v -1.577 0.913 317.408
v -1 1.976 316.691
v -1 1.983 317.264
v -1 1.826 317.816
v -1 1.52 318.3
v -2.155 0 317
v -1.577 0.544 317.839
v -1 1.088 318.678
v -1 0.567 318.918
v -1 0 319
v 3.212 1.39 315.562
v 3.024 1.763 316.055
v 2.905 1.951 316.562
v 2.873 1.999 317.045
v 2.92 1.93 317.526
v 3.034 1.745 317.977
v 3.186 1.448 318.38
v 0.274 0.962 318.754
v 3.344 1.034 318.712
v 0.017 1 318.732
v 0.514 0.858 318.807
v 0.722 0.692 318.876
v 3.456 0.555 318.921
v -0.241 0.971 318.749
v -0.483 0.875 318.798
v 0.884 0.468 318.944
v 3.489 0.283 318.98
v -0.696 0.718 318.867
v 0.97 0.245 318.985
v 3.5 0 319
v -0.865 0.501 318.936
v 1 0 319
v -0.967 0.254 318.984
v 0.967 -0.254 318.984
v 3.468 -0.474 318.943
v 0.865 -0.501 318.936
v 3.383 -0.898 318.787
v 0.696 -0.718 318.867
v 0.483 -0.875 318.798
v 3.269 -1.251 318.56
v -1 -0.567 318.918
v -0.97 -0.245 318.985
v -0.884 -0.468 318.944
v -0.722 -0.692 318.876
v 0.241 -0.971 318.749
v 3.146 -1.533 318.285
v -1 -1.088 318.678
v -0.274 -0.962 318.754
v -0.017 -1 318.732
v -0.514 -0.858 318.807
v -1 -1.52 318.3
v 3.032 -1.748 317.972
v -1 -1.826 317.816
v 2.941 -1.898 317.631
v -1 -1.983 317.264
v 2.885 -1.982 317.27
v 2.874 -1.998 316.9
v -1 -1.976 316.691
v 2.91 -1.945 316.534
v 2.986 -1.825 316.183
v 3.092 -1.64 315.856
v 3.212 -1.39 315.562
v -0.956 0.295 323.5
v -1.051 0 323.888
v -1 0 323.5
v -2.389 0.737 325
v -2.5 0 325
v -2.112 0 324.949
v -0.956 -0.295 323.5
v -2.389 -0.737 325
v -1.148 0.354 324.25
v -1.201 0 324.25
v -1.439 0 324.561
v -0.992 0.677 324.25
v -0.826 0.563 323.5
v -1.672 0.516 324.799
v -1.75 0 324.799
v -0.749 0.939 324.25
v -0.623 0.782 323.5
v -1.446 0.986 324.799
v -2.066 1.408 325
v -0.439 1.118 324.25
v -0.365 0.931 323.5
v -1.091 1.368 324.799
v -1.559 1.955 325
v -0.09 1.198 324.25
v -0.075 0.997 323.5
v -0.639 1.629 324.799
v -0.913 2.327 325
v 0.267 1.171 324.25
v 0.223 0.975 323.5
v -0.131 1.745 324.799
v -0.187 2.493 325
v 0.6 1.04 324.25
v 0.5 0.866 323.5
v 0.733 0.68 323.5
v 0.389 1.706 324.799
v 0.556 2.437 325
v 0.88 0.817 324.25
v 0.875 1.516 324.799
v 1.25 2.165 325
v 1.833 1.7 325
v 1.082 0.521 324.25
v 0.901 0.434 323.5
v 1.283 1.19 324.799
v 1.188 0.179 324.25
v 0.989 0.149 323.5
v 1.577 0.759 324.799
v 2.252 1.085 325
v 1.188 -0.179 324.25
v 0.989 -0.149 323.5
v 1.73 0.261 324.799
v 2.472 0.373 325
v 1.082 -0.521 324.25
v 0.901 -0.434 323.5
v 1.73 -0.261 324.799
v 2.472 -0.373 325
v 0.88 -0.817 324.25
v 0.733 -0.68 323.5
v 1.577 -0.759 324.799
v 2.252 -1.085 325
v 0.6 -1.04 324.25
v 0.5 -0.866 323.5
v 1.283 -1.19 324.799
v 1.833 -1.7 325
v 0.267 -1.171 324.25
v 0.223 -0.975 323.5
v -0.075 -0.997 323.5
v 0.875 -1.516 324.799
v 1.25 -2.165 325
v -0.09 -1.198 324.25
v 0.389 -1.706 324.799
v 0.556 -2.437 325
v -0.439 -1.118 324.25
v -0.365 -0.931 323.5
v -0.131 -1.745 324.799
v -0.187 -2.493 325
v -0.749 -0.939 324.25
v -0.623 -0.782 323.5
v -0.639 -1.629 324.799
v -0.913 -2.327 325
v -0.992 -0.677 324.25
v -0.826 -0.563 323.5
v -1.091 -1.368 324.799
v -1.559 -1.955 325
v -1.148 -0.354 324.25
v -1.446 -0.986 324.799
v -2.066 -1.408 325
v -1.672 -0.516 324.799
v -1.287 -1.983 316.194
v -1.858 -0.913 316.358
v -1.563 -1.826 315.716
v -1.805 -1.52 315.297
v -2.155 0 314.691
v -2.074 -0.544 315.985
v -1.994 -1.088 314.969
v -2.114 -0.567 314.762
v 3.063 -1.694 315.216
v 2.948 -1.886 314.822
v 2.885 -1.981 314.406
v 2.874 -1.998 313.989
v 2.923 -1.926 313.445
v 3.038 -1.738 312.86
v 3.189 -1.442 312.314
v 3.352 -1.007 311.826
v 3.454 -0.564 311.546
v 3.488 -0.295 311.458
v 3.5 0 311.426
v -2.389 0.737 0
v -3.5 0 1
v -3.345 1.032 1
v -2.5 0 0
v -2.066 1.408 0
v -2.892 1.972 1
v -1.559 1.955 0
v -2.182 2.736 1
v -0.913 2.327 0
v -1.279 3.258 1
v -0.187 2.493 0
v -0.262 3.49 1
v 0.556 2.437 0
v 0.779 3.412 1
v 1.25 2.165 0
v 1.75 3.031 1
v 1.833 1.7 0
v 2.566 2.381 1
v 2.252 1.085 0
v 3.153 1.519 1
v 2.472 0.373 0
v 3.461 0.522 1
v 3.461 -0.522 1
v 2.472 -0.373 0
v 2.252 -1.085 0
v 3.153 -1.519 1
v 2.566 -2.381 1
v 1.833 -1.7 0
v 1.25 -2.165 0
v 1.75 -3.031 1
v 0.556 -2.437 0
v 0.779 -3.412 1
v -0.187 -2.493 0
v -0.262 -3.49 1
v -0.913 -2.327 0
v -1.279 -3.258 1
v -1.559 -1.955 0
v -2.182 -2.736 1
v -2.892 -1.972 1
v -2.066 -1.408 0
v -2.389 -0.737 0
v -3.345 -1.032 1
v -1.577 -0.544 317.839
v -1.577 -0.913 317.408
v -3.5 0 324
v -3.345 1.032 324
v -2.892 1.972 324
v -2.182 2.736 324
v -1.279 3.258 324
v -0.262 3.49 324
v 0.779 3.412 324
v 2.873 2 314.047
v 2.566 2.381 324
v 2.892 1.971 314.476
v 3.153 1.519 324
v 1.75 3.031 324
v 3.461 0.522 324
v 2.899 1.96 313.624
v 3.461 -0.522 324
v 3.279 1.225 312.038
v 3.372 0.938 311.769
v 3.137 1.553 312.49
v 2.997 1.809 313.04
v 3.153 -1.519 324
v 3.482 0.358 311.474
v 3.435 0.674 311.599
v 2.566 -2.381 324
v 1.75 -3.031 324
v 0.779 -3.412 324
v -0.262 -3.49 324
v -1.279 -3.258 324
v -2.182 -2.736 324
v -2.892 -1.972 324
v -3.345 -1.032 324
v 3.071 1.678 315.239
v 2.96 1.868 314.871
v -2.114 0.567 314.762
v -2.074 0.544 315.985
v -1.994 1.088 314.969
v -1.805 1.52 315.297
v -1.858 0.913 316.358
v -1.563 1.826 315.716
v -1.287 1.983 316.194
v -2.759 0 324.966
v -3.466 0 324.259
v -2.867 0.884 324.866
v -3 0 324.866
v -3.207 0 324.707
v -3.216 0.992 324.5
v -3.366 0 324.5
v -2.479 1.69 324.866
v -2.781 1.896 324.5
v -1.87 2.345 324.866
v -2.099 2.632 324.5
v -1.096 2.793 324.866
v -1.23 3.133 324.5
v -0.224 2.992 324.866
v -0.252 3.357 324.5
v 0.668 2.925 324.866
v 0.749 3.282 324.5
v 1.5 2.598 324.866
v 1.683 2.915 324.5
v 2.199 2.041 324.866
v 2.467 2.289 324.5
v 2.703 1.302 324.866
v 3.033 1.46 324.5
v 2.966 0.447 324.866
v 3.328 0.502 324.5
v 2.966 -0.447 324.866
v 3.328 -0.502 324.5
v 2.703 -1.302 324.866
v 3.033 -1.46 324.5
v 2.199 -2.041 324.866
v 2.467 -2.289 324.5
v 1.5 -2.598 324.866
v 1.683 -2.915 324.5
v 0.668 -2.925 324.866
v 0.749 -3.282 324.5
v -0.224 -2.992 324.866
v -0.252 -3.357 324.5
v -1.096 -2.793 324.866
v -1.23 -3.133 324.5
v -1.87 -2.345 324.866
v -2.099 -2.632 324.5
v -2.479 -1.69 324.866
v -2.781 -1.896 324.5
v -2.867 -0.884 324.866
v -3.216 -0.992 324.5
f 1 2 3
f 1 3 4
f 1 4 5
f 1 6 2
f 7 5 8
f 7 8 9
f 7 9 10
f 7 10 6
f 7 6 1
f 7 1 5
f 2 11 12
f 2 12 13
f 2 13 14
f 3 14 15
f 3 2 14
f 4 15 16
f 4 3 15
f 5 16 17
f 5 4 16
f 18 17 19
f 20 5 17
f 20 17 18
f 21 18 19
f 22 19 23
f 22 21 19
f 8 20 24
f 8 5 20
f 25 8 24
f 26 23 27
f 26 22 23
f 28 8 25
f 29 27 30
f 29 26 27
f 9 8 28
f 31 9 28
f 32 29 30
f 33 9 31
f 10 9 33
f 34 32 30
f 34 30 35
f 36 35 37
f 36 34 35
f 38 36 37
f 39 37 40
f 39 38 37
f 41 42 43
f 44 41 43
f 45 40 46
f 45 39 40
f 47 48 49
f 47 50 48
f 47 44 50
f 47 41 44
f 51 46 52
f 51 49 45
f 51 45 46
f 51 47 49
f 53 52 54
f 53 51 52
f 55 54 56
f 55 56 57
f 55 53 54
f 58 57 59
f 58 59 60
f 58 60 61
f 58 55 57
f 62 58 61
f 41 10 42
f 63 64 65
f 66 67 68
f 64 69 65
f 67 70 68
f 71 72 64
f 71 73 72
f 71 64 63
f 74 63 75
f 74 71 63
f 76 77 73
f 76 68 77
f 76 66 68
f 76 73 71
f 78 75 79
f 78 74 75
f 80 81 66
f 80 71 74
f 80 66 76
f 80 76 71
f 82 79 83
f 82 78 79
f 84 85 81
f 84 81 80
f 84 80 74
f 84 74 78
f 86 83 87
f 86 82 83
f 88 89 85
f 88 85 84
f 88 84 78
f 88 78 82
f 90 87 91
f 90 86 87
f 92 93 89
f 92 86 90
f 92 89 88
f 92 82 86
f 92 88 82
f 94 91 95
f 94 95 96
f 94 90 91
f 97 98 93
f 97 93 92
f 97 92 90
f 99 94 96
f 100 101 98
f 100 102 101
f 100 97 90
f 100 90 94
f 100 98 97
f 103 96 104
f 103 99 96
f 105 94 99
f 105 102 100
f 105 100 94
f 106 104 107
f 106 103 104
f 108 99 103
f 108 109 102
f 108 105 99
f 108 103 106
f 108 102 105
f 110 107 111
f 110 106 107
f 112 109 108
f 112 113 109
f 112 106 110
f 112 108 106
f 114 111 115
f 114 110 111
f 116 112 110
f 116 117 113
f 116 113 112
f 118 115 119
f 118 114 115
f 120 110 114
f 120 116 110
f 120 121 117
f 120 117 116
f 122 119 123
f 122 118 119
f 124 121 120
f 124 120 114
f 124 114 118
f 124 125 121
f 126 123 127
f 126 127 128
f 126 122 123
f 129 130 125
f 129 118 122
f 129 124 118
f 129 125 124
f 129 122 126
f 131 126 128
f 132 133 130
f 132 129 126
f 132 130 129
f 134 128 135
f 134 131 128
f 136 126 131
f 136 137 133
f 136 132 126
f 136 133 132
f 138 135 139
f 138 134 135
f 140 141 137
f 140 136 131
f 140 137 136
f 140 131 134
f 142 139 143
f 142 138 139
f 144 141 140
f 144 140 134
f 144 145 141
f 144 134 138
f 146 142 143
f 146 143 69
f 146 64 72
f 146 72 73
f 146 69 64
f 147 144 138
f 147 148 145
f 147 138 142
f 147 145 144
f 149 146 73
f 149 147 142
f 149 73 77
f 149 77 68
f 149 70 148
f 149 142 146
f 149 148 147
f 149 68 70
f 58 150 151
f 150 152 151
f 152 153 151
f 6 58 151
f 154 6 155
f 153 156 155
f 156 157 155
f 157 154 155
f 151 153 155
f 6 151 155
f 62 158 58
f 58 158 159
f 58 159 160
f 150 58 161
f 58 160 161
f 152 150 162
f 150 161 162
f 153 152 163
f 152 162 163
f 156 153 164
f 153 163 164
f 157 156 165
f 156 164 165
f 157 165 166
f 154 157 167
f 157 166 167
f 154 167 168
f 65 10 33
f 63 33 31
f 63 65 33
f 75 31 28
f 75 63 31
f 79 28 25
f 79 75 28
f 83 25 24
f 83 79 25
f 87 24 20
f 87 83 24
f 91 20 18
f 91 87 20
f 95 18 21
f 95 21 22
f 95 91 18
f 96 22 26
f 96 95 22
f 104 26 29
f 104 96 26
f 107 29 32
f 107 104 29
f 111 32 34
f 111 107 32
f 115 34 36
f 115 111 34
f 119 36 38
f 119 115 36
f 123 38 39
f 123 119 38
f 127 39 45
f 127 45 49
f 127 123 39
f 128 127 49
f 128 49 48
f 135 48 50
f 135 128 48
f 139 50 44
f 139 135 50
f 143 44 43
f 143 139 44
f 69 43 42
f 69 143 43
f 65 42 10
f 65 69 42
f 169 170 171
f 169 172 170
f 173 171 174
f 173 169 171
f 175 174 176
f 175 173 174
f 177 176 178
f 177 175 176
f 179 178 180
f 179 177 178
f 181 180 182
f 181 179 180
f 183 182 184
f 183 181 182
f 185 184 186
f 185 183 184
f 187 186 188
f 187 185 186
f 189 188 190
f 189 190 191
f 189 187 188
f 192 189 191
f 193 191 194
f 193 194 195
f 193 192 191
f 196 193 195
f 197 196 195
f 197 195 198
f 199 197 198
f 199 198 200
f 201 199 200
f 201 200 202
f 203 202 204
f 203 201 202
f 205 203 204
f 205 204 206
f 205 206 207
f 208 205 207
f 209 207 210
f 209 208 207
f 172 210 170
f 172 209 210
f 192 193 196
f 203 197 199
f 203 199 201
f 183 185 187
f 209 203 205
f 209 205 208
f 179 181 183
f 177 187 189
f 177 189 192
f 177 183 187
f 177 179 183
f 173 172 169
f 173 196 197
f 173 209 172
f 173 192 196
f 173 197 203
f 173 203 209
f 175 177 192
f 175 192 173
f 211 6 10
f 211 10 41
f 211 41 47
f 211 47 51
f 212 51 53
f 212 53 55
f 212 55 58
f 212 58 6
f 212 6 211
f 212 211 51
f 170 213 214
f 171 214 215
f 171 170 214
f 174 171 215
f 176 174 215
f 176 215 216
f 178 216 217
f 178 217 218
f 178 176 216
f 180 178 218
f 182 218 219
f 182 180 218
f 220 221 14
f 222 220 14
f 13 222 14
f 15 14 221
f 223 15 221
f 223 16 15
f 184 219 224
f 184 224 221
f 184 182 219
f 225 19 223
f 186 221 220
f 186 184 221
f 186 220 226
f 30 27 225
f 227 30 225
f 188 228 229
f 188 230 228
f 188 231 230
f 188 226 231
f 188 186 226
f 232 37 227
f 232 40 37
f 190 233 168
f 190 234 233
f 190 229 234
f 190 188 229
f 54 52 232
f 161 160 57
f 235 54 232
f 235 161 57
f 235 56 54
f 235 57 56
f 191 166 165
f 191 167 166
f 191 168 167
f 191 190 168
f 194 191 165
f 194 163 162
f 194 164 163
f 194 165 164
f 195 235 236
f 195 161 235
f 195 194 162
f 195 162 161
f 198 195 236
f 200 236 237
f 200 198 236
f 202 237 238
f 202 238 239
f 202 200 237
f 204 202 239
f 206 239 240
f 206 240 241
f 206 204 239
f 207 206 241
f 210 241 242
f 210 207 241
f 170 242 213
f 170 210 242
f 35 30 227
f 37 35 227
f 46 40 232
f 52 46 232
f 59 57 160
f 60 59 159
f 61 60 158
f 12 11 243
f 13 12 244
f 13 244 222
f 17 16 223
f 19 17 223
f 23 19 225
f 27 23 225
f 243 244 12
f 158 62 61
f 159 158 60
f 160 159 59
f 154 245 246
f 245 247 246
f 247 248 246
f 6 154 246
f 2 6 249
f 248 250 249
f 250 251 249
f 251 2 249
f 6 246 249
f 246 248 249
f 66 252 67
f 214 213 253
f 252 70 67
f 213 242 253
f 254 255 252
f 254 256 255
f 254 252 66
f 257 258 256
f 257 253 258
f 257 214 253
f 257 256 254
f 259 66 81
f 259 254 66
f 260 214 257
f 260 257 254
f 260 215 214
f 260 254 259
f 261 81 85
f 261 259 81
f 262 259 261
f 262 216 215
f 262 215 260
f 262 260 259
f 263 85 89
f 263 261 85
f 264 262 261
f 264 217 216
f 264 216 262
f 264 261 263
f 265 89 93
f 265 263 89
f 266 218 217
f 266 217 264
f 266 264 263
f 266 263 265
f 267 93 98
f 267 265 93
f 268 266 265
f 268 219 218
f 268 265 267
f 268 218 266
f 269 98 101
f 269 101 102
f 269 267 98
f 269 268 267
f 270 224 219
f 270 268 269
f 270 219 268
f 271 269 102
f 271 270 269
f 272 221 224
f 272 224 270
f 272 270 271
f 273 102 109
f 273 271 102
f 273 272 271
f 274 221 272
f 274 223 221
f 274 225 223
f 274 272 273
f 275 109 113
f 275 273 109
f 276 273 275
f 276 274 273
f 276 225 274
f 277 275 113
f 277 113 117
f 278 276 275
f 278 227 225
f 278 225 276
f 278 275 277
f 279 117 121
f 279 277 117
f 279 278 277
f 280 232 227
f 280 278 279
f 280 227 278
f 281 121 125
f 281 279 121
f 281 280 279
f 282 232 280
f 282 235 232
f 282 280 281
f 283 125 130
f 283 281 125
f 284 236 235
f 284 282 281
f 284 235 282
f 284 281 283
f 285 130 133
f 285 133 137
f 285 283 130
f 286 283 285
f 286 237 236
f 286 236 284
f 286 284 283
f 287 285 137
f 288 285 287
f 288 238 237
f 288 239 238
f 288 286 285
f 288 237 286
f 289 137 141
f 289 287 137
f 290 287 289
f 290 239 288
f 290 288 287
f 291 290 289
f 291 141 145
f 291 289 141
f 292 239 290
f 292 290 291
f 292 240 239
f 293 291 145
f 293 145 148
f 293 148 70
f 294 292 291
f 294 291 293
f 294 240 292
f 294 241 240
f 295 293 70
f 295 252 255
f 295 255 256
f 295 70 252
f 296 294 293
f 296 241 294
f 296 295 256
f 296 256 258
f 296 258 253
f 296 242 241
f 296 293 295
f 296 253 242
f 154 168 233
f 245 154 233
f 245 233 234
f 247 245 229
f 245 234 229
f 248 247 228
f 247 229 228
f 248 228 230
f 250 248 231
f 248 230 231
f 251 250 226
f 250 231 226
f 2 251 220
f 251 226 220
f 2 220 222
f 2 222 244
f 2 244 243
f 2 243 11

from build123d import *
from build123d import SkipClean  # not in build123d's __all__


with BuildPart() as f1:
    # F0 (on Front) → F1 (revolve)
    with BuildSketch(Plane.XZ):
        with BuildLine():
            Line((-3.5, 324), (-3.5, 1))
            Line((-3.5, 1), (-2.5, 0))
            Line((-2.5, 0), (0, 0))
            Line((0, 0), (0, 317.4226497308))
            Line((0, 317.4226497308), (-1, 318))
            Line((-1, 318), (-1, 323.5))
            ThreePointArc((-1, 323.5), (-1.4393398282, 324.5606601718), (-2.5, 325))
            ThreePointArc((-2.5, 325), (-3.2071067812, 324.7071067812), (-3.5, 324))
        make_face()
    revolve(axis=Axis((0, 0, 158.7113248654), (0, 0, -1)))

    # F2 (on Front) → F3 (revolve, cut)
    with BuildSketch(Plane.XZ):
        Polygon((-1, 319), (-2.1547005384, 317), (10.5847728806, 317), (10.5847728806, 319), align=None)
    revolve(axis=Axis((7.4317818913, 0, 317), (1, 0, 0)), mode=Mode.SUBTRACT)

    # F4 (on Front) → F5 (revolve, cut)
    with BuildSketch(Plane.XZ):
        Polygon((7.5055534995, 311.4226497308), (1.3094010768, 315), (-1, 315), (-1, 316.3333333333), (-2.1547005384, 317), (-2.1547005384, 314.6905989232), (6.5055534995, 309.6905989232), align=None)
        Polygon((-1, 315), (1.3094010768, 315), (-1, 316.3333333333), align=None)
    with SkipClean():  # cleaning this boolean's faces spoils the solid; the shape is the same uncleaned
        revolve(axis=Axis((2.6754264805, 0, 314.2113248654), (0.8660254038, 0, -0.5)), mode=Mode.SUBTRACT)


solid = f1.part
